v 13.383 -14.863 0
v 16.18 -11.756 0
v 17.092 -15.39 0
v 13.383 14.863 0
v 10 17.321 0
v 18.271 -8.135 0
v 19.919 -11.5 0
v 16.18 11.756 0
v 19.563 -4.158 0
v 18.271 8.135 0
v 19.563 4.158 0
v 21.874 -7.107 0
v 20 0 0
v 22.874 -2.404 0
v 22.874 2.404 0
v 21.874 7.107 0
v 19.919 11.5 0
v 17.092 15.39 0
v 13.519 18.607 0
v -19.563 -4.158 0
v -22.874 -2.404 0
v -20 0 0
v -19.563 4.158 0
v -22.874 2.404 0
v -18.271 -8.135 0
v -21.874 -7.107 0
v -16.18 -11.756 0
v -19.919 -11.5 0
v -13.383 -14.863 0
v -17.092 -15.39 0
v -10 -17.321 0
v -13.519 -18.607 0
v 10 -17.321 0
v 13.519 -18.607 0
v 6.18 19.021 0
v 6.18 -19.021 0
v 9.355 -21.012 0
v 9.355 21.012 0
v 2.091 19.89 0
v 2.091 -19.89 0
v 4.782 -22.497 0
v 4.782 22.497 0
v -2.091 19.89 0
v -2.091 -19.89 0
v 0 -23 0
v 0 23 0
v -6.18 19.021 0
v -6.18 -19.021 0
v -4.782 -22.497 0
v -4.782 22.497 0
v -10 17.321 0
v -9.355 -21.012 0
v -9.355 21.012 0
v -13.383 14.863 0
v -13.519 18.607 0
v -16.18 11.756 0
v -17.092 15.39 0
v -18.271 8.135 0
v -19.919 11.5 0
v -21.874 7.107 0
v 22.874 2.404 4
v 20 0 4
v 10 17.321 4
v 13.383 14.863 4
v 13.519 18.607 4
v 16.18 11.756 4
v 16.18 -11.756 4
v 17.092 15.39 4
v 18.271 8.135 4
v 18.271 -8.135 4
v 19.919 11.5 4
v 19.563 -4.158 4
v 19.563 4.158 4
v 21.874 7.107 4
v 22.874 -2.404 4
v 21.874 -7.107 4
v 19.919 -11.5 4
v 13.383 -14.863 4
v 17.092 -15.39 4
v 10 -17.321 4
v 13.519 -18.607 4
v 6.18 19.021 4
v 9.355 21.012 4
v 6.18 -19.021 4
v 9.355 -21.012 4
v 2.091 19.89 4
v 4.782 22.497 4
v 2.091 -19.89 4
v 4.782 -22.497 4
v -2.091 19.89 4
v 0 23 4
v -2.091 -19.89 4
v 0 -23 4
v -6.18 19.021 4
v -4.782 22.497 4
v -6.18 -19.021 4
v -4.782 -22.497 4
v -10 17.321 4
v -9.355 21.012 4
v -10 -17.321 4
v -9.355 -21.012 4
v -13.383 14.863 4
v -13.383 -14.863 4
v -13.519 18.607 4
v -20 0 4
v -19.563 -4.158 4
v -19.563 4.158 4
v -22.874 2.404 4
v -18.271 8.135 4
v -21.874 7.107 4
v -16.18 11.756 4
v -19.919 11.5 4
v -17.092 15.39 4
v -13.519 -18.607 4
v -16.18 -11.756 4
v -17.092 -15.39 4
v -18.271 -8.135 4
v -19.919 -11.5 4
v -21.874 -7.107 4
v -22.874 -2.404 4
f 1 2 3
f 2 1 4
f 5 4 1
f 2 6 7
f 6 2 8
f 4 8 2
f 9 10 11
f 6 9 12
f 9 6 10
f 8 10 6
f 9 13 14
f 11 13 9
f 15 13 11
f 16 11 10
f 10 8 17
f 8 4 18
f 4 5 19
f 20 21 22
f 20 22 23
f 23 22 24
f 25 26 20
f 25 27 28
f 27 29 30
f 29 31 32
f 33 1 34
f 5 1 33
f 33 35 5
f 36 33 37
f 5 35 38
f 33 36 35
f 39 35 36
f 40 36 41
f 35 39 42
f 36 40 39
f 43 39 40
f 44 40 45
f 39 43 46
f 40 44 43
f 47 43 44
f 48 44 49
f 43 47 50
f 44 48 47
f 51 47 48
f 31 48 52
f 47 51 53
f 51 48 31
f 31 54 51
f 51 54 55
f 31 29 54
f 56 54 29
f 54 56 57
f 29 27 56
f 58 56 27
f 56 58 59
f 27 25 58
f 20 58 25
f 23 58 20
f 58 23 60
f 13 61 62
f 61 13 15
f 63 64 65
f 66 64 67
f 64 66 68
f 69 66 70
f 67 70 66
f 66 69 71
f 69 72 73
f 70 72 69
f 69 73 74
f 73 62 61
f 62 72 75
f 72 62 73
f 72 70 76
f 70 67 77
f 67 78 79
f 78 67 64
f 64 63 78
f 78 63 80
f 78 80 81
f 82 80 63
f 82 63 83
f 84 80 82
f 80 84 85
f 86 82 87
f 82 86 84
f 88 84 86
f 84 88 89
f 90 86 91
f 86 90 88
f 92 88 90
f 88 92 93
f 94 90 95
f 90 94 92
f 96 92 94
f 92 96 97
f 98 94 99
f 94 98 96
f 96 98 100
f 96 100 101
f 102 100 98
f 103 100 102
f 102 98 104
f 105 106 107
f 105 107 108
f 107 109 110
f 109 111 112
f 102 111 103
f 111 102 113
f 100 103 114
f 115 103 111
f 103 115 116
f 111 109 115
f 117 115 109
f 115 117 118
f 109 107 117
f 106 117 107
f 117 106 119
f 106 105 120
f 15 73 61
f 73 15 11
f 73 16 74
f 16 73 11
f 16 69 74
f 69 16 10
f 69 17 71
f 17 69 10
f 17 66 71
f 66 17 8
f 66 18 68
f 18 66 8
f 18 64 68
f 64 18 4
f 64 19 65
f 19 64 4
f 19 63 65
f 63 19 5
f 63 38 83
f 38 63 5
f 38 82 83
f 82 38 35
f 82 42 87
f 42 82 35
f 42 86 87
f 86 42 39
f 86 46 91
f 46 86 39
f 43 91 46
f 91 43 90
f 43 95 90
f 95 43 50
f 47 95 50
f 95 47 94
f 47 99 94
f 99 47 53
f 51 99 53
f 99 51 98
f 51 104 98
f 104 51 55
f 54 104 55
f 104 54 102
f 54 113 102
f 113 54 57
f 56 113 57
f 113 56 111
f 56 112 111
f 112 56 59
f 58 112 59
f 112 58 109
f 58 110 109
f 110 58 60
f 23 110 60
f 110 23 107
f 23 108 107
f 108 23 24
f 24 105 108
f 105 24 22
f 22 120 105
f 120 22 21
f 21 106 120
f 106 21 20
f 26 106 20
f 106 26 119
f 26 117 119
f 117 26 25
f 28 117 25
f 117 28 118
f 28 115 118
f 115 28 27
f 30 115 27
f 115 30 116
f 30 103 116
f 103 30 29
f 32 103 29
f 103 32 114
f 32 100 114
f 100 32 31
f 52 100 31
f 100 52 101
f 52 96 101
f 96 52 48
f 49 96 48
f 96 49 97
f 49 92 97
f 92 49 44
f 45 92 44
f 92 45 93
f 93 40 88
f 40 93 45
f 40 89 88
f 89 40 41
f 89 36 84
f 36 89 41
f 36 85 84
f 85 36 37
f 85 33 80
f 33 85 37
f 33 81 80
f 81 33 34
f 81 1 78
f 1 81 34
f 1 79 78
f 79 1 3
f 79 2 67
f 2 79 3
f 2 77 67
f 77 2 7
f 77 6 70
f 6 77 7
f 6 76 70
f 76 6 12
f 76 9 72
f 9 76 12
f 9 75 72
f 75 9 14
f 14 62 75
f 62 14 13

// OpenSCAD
module gear(height, radius, teeth_depth, teeth=30) {
	cylinder(h=height, r=radius, $fn=teeth);
	for(tooth = [0:teeth]) {
		rotate([0, 0, tooth * 360 / teeth]) {
			linear_extrude(height=height) {
				polygon(points=[[radius, 0], [cos(360 / teeth) * radius, sin(360 / teeth) * radius], [cos(180 / teeth) * (radius + teeth_depth), sin(180 / teeth) * (radius + teeth_depth)]], convexity=1);
			}
		}
	}
}

gear(height=4, radius=20, teeth_depth=3);
